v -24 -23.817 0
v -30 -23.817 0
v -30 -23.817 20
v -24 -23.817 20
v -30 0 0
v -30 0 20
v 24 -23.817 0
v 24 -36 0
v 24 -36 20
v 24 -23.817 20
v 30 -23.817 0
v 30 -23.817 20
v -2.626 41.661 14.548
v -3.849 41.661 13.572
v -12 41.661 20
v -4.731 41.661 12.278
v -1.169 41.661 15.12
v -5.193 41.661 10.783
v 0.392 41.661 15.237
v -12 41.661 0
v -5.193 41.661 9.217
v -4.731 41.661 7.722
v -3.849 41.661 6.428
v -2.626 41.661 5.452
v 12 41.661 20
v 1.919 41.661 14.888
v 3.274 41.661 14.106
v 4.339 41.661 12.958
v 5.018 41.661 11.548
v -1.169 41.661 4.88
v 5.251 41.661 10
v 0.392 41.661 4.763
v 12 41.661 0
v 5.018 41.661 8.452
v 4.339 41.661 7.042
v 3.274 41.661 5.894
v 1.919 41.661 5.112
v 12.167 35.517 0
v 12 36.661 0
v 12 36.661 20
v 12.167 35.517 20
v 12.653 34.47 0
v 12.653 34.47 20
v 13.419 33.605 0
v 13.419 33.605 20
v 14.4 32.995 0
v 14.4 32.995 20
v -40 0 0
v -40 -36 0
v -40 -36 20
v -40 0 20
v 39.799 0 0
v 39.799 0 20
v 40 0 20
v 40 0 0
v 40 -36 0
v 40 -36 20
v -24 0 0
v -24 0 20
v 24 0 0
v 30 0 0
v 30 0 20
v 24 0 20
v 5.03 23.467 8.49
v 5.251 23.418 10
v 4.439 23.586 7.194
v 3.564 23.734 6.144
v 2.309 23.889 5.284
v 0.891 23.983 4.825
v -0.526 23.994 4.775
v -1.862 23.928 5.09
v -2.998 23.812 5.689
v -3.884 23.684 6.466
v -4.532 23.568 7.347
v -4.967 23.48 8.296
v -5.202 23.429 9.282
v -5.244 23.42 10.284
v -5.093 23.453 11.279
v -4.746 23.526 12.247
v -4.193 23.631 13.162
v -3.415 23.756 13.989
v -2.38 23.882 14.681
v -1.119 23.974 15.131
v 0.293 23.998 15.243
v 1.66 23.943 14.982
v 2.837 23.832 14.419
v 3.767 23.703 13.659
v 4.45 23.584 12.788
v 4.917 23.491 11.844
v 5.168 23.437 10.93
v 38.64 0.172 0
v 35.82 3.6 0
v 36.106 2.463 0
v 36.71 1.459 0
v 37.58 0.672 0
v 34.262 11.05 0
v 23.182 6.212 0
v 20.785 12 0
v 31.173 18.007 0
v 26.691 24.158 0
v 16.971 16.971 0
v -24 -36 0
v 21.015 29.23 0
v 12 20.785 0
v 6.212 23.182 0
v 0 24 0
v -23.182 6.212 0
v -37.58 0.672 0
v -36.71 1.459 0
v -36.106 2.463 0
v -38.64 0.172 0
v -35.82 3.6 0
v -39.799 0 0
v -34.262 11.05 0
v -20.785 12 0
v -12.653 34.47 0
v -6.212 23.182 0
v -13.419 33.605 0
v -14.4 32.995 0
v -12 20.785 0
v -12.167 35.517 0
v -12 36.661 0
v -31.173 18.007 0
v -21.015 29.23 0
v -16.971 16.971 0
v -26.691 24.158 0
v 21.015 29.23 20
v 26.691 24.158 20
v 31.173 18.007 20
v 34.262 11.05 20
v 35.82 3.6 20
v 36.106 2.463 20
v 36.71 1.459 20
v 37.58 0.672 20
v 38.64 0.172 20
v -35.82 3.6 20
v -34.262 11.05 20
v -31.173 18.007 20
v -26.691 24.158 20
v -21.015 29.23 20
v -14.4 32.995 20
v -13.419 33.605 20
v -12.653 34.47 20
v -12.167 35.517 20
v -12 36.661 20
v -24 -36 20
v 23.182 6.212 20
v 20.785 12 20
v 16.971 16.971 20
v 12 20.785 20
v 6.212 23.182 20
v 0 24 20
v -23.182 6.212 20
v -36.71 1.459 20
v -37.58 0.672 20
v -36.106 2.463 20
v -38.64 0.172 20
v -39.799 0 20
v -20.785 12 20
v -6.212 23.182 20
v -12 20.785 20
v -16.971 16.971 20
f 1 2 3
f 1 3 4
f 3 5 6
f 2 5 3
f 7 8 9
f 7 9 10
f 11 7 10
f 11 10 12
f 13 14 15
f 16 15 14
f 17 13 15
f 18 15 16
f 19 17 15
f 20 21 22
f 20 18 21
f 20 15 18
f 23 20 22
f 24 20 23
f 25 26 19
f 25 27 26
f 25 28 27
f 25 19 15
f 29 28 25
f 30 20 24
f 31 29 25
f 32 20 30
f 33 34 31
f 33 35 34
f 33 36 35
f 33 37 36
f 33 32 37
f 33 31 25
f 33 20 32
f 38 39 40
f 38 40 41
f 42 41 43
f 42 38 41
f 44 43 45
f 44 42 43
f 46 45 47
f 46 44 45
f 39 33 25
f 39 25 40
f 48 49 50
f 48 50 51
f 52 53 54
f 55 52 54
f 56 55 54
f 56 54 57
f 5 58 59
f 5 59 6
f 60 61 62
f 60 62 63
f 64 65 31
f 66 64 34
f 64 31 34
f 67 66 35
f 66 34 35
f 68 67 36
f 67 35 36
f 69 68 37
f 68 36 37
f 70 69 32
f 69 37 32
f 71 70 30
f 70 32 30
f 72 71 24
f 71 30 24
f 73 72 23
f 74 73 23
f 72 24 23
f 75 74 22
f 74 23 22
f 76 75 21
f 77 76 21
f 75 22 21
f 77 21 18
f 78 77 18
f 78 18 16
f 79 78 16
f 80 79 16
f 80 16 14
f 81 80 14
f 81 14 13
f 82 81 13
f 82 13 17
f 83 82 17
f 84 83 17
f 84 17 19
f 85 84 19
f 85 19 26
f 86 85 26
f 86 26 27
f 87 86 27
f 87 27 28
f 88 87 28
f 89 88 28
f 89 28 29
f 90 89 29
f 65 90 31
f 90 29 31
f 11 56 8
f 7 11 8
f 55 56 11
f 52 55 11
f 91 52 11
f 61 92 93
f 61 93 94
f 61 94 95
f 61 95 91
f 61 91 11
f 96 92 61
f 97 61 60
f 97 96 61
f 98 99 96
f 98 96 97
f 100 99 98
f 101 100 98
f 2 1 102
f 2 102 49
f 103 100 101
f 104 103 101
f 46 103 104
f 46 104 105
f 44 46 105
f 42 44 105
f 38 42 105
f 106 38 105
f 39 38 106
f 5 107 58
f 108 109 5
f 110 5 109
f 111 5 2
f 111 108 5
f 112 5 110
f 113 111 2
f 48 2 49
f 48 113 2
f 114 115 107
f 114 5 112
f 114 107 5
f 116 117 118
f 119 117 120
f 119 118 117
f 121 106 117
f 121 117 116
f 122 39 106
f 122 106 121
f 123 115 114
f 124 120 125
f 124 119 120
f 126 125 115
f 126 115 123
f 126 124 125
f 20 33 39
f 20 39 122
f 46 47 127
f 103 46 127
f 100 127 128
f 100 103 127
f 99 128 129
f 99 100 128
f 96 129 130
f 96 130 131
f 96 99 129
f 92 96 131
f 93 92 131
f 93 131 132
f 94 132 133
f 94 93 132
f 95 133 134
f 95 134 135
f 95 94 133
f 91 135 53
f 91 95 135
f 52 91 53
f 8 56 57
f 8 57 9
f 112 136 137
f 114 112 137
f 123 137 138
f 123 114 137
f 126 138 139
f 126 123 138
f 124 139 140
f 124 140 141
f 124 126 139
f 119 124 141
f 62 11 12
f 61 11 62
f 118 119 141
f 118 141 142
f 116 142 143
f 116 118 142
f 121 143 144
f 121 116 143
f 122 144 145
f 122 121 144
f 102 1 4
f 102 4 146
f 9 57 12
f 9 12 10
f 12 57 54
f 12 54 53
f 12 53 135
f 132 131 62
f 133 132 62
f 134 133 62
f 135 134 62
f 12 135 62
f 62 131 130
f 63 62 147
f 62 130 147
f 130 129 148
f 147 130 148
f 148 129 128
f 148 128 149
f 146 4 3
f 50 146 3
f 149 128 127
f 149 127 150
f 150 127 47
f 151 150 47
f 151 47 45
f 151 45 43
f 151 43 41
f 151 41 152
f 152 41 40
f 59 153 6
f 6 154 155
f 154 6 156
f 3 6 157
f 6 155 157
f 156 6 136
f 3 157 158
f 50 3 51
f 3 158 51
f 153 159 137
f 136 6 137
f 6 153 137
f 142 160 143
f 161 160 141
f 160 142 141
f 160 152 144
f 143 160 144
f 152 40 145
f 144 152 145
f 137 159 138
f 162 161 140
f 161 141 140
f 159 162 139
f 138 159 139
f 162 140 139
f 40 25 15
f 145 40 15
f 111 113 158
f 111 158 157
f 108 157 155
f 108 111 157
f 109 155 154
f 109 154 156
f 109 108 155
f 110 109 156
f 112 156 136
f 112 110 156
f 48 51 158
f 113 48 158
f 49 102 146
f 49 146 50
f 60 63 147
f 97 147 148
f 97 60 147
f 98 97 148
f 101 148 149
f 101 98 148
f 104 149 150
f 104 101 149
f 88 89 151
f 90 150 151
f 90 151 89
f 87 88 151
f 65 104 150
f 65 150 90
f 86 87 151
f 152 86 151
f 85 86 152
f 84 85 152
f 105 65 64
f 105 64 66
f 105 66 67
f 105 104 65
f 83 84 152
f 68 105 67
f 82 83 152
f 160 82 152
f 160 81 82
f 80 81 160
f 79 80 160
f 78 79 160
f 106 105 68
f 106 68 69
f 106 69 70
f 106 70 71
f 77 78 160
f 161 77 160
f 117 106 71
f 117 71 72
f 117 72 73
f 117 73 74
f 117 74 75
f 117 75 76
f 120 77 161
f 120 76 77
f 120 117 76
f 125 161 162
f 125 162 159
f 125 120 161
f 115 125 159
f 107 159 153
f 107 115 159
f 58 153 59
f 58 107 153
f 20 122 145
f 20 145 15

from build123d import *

# Parameters (mm, degrees)
Y_KSEKLIK_EKSTR_ZYON1_DEPTH = 20
IZIM2_R                     = 5.251294355
KES_EKSTR_ZYON1_DEPTH       = 35


with BuildPart() as part:
    # Çizim1 → Yükseklik-Ekstrüzyon1 (new body)
    with BuildSketch(Plane.XY):
        with BuildLine():
            Line((39.799497484, 0), (40, 0))
            Line((40, 0), (40, -36))
            Line((40, -36), (24, -36))
            Line((24, -36), (24, -23.81673939))
            Line((24, -23.81673939), (30, -23.81673939))
            Line((30, -23.81673939), (30, 0))
            Line((30, 0), (24, 0))
            ThreePointArc((24, 0), (0, 24), (-24, 0))
            Line((-24, 0), (-30, 0))
            Line((-30, 0), (-30, -23.81673939))
            Line((-30, -23.81673939), (-24, -23.81673939))
            Line((-24, -23.81673939), (-24, -36))
            Line((-24, -36), (-40, -36))
            Line((-40, -36), (-40, 0))
            Line((-40, 0), (-39.799497484, 0))
            ThreePointArc((-39.799497484, 0), (-37.116215911, 1.033520605), (-35.819547736, 3.6))
            ThreePointArc((-35.819547736, 3.6), (-29.094854574, 21.201165942), (-14.4, 32.994545004))
            ThreePointArc((-14.4, 32.994545004), (-12.653359894, 34.46971533), (-12, 36.66060556))
            Line((-12, 36.66060556), (-12, 41.66060556))
            Line((-12, 41.66060556), (12, 41.66060556))
            Line((12, 41.66060556), (12, 36.66060556))
            ThreePointArc((12, 36.66060556), (12.653359894, 34.46971533), (14.4, 32.994545004))
            ThreePointArc((14.4, 32.994545004), (29.094854574, 21.201165942), (35.819547736, 3.6))
            ThreePointArc((35.819547736, 3.6), (37.116215911, 1.033520605), (39.799497484, 0))
        make_face()
    extrude(amount=Y_KSEKLIK_EKSTR_ZYON1_DEPTH)

    # Çizim2 → Kes-Ekstrüzyon1 (cut)
    with BuildSketch(Plane(origin=(0, 41.66060556, 0), x_dir=(1, 0, 0), z_dir=(0, 1, 0))):
        with Locations((0, -10)):
            Circle(IZIM2_R)
    extrude(amount=-KES_EKSTR_ZYON1_DEPTH, mode=Mode.SUBTRACT)


solid = part.part
